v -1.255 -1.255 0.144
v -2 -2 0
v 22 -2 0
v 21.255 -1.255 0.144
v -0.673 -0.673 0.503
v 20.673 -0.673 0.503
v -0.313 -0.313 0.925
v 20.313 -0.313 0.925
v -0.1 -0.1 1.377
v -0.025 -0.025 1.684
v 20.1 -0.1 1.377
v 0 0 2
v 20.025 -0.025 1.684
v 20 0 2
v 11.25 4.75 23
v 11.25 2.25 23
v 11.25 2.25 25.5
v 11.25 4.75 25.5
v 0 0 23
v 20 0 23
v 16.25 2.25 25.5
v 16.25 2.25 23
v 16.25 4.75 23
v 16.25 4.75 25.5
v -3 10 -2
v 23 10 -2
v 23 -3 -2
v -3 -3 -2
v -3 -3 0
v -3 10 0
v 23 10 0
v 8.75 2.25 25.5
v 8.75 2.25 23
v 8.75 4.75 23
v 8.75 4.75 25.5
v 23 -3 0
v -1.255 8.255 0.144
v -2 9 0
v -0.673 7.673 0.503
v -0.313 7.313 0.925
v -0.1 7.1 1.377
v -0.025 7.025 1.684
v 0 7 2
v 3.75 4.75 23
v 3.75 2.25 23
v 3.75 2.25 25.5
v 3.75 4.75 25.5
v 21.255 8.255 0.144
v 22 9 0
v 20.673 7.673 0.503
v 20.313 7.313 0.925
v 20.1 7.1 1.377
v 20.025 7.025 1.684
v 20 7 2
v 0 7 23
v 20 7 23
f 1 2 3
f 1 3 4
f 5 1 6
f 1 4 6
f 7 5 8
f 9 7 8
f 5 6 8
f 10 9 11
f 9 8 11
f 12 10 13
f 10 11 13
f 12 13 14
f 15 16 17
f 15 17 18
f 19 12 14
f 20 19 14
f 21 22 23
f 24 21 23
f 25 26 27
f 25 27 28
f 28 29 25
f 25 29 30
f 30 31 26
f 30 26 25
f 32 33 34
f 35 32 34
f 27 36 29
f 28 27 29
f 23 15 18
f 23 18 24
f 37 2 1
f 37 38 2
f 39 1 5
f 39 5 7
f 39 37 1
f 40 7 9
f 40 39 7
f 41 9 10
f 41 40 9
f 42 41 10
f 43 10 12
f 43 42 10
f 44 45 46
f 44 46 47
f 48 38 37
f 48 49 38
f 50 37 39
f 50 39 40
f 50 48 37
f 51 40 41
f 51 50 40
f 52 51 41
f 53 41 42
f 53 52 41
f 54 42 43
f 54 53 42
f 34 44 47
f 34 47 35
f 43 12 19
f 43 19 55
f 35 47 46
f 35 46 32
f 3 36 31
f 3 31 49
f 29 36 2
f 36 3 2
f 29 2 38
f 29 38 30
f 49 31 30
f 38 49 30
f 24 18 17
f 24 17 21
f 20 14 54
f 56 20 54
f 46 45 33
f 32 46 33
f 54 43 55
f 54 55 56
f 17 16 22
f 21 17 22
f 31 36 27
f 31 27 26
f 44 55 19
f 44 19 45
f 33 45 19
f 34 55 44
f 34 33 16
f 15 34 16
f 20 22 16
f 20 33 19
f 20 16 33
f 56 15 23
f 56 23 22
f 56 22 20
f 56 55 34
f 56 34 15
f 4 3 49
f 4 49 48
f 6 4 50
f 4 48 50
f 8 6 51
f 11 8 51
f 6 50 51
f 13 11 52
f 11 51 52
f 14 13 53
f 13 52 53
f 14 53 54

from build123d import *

# Parameters (mm, degrees)
ESQUISSE1_W        = 20
ESQUISSE1_H        = 7
BOSS_EXTRU_1_DEPTH = 23
ESQUISSE2_W        = 5
ESQUISSE2_H        = 2.5
BOSS_EXTRU_2_DEPTH = 2.5
ESQUISSE3_W        = 3
ESQUISSE3_H        = 3
ESQUISSE3_W_2      = 20
ESQUISSE3_H_2      = 7
BOSS_EXTRU_3_DEPTH = 2
CONG_1_R           = 2


with BuildPart() as part:
    # Esquisse1 → Boss.-Extru.1 (new body)
    with BuildSketch(Plane.XY):
        with Locations((10, 3.5)):
            Rectangle(ESQUISSE1_W, ESQUISSE1_H)
    extrude(amount=BOSS_EXTRU_1_DEPTH)

    # Esquisse2 → Boss.-Extru.2 (add)
    with BuildSketch(Plane.XY.offset(23)):
        with Locations((6.25, 3.5)):
            Rectangle(ESQUISSE2_W, ESQUISSE2_H)
        with Locations((13.75, 3.5)):
            Rectangle(ESQUISSE2_W, ESQUISSE2_H)
    extrude(amount=BOSS_EXTRU_2_DEPTH)

    # Esquisse3 → Boss.-Extru.3 (add)
    # profile 1 of 3: a face of its own
    with BuildSketch(Plane(origin=(0, 0, 0), x_dir=(-1, 0, 0), z_dir=(0, 0, -1))):
        with Locations((-21.5, 8.5)):
            Rectangle(ESQUISSE3_W, ESQUISSE3_H)
    # profile 2 of 3: a face of its own
    with BuildSketch(Plane(origin=(0, 0, 0), x_dir=(-1, 0, 0), z_dir=(0, 0, -1))):
        Polygon((-20, 10), (-20, 7), (-23, 7), (-23, -3), (3, -3), (3, 10), align=None)
        with Locations((-10, 3.5)):
            Rectangle(ESQUISSE3_W_2, ESQUISSE3_H_2, mode=Mode.SUBTRACT)
    # profile 3 of 3: a face of its own
    with BuildSketch(Plane(origin=(0, 0, 0), x_dir=(-1, 0, 0), z_dir=(0, 0, -1))):
        with Locations((-10, 3.5)):
            Rectangle(ESQUISSE3_W_2, ESQUISSE3_H_2)
    extrude(amount=BOSS_EXTRU_3_DEPTH)

    # Congé1
    cong_1_edges = [part.edges().sort_by_distance(p)[0] for p in [
        (10, 7, 0),
        (20, 3.5, 0),
        (10, 0, 0),
        (0, 3.5, 0),
    ]]
    fillet(cong_1_edges, radius=CONG_1_R)


solid = part.part
